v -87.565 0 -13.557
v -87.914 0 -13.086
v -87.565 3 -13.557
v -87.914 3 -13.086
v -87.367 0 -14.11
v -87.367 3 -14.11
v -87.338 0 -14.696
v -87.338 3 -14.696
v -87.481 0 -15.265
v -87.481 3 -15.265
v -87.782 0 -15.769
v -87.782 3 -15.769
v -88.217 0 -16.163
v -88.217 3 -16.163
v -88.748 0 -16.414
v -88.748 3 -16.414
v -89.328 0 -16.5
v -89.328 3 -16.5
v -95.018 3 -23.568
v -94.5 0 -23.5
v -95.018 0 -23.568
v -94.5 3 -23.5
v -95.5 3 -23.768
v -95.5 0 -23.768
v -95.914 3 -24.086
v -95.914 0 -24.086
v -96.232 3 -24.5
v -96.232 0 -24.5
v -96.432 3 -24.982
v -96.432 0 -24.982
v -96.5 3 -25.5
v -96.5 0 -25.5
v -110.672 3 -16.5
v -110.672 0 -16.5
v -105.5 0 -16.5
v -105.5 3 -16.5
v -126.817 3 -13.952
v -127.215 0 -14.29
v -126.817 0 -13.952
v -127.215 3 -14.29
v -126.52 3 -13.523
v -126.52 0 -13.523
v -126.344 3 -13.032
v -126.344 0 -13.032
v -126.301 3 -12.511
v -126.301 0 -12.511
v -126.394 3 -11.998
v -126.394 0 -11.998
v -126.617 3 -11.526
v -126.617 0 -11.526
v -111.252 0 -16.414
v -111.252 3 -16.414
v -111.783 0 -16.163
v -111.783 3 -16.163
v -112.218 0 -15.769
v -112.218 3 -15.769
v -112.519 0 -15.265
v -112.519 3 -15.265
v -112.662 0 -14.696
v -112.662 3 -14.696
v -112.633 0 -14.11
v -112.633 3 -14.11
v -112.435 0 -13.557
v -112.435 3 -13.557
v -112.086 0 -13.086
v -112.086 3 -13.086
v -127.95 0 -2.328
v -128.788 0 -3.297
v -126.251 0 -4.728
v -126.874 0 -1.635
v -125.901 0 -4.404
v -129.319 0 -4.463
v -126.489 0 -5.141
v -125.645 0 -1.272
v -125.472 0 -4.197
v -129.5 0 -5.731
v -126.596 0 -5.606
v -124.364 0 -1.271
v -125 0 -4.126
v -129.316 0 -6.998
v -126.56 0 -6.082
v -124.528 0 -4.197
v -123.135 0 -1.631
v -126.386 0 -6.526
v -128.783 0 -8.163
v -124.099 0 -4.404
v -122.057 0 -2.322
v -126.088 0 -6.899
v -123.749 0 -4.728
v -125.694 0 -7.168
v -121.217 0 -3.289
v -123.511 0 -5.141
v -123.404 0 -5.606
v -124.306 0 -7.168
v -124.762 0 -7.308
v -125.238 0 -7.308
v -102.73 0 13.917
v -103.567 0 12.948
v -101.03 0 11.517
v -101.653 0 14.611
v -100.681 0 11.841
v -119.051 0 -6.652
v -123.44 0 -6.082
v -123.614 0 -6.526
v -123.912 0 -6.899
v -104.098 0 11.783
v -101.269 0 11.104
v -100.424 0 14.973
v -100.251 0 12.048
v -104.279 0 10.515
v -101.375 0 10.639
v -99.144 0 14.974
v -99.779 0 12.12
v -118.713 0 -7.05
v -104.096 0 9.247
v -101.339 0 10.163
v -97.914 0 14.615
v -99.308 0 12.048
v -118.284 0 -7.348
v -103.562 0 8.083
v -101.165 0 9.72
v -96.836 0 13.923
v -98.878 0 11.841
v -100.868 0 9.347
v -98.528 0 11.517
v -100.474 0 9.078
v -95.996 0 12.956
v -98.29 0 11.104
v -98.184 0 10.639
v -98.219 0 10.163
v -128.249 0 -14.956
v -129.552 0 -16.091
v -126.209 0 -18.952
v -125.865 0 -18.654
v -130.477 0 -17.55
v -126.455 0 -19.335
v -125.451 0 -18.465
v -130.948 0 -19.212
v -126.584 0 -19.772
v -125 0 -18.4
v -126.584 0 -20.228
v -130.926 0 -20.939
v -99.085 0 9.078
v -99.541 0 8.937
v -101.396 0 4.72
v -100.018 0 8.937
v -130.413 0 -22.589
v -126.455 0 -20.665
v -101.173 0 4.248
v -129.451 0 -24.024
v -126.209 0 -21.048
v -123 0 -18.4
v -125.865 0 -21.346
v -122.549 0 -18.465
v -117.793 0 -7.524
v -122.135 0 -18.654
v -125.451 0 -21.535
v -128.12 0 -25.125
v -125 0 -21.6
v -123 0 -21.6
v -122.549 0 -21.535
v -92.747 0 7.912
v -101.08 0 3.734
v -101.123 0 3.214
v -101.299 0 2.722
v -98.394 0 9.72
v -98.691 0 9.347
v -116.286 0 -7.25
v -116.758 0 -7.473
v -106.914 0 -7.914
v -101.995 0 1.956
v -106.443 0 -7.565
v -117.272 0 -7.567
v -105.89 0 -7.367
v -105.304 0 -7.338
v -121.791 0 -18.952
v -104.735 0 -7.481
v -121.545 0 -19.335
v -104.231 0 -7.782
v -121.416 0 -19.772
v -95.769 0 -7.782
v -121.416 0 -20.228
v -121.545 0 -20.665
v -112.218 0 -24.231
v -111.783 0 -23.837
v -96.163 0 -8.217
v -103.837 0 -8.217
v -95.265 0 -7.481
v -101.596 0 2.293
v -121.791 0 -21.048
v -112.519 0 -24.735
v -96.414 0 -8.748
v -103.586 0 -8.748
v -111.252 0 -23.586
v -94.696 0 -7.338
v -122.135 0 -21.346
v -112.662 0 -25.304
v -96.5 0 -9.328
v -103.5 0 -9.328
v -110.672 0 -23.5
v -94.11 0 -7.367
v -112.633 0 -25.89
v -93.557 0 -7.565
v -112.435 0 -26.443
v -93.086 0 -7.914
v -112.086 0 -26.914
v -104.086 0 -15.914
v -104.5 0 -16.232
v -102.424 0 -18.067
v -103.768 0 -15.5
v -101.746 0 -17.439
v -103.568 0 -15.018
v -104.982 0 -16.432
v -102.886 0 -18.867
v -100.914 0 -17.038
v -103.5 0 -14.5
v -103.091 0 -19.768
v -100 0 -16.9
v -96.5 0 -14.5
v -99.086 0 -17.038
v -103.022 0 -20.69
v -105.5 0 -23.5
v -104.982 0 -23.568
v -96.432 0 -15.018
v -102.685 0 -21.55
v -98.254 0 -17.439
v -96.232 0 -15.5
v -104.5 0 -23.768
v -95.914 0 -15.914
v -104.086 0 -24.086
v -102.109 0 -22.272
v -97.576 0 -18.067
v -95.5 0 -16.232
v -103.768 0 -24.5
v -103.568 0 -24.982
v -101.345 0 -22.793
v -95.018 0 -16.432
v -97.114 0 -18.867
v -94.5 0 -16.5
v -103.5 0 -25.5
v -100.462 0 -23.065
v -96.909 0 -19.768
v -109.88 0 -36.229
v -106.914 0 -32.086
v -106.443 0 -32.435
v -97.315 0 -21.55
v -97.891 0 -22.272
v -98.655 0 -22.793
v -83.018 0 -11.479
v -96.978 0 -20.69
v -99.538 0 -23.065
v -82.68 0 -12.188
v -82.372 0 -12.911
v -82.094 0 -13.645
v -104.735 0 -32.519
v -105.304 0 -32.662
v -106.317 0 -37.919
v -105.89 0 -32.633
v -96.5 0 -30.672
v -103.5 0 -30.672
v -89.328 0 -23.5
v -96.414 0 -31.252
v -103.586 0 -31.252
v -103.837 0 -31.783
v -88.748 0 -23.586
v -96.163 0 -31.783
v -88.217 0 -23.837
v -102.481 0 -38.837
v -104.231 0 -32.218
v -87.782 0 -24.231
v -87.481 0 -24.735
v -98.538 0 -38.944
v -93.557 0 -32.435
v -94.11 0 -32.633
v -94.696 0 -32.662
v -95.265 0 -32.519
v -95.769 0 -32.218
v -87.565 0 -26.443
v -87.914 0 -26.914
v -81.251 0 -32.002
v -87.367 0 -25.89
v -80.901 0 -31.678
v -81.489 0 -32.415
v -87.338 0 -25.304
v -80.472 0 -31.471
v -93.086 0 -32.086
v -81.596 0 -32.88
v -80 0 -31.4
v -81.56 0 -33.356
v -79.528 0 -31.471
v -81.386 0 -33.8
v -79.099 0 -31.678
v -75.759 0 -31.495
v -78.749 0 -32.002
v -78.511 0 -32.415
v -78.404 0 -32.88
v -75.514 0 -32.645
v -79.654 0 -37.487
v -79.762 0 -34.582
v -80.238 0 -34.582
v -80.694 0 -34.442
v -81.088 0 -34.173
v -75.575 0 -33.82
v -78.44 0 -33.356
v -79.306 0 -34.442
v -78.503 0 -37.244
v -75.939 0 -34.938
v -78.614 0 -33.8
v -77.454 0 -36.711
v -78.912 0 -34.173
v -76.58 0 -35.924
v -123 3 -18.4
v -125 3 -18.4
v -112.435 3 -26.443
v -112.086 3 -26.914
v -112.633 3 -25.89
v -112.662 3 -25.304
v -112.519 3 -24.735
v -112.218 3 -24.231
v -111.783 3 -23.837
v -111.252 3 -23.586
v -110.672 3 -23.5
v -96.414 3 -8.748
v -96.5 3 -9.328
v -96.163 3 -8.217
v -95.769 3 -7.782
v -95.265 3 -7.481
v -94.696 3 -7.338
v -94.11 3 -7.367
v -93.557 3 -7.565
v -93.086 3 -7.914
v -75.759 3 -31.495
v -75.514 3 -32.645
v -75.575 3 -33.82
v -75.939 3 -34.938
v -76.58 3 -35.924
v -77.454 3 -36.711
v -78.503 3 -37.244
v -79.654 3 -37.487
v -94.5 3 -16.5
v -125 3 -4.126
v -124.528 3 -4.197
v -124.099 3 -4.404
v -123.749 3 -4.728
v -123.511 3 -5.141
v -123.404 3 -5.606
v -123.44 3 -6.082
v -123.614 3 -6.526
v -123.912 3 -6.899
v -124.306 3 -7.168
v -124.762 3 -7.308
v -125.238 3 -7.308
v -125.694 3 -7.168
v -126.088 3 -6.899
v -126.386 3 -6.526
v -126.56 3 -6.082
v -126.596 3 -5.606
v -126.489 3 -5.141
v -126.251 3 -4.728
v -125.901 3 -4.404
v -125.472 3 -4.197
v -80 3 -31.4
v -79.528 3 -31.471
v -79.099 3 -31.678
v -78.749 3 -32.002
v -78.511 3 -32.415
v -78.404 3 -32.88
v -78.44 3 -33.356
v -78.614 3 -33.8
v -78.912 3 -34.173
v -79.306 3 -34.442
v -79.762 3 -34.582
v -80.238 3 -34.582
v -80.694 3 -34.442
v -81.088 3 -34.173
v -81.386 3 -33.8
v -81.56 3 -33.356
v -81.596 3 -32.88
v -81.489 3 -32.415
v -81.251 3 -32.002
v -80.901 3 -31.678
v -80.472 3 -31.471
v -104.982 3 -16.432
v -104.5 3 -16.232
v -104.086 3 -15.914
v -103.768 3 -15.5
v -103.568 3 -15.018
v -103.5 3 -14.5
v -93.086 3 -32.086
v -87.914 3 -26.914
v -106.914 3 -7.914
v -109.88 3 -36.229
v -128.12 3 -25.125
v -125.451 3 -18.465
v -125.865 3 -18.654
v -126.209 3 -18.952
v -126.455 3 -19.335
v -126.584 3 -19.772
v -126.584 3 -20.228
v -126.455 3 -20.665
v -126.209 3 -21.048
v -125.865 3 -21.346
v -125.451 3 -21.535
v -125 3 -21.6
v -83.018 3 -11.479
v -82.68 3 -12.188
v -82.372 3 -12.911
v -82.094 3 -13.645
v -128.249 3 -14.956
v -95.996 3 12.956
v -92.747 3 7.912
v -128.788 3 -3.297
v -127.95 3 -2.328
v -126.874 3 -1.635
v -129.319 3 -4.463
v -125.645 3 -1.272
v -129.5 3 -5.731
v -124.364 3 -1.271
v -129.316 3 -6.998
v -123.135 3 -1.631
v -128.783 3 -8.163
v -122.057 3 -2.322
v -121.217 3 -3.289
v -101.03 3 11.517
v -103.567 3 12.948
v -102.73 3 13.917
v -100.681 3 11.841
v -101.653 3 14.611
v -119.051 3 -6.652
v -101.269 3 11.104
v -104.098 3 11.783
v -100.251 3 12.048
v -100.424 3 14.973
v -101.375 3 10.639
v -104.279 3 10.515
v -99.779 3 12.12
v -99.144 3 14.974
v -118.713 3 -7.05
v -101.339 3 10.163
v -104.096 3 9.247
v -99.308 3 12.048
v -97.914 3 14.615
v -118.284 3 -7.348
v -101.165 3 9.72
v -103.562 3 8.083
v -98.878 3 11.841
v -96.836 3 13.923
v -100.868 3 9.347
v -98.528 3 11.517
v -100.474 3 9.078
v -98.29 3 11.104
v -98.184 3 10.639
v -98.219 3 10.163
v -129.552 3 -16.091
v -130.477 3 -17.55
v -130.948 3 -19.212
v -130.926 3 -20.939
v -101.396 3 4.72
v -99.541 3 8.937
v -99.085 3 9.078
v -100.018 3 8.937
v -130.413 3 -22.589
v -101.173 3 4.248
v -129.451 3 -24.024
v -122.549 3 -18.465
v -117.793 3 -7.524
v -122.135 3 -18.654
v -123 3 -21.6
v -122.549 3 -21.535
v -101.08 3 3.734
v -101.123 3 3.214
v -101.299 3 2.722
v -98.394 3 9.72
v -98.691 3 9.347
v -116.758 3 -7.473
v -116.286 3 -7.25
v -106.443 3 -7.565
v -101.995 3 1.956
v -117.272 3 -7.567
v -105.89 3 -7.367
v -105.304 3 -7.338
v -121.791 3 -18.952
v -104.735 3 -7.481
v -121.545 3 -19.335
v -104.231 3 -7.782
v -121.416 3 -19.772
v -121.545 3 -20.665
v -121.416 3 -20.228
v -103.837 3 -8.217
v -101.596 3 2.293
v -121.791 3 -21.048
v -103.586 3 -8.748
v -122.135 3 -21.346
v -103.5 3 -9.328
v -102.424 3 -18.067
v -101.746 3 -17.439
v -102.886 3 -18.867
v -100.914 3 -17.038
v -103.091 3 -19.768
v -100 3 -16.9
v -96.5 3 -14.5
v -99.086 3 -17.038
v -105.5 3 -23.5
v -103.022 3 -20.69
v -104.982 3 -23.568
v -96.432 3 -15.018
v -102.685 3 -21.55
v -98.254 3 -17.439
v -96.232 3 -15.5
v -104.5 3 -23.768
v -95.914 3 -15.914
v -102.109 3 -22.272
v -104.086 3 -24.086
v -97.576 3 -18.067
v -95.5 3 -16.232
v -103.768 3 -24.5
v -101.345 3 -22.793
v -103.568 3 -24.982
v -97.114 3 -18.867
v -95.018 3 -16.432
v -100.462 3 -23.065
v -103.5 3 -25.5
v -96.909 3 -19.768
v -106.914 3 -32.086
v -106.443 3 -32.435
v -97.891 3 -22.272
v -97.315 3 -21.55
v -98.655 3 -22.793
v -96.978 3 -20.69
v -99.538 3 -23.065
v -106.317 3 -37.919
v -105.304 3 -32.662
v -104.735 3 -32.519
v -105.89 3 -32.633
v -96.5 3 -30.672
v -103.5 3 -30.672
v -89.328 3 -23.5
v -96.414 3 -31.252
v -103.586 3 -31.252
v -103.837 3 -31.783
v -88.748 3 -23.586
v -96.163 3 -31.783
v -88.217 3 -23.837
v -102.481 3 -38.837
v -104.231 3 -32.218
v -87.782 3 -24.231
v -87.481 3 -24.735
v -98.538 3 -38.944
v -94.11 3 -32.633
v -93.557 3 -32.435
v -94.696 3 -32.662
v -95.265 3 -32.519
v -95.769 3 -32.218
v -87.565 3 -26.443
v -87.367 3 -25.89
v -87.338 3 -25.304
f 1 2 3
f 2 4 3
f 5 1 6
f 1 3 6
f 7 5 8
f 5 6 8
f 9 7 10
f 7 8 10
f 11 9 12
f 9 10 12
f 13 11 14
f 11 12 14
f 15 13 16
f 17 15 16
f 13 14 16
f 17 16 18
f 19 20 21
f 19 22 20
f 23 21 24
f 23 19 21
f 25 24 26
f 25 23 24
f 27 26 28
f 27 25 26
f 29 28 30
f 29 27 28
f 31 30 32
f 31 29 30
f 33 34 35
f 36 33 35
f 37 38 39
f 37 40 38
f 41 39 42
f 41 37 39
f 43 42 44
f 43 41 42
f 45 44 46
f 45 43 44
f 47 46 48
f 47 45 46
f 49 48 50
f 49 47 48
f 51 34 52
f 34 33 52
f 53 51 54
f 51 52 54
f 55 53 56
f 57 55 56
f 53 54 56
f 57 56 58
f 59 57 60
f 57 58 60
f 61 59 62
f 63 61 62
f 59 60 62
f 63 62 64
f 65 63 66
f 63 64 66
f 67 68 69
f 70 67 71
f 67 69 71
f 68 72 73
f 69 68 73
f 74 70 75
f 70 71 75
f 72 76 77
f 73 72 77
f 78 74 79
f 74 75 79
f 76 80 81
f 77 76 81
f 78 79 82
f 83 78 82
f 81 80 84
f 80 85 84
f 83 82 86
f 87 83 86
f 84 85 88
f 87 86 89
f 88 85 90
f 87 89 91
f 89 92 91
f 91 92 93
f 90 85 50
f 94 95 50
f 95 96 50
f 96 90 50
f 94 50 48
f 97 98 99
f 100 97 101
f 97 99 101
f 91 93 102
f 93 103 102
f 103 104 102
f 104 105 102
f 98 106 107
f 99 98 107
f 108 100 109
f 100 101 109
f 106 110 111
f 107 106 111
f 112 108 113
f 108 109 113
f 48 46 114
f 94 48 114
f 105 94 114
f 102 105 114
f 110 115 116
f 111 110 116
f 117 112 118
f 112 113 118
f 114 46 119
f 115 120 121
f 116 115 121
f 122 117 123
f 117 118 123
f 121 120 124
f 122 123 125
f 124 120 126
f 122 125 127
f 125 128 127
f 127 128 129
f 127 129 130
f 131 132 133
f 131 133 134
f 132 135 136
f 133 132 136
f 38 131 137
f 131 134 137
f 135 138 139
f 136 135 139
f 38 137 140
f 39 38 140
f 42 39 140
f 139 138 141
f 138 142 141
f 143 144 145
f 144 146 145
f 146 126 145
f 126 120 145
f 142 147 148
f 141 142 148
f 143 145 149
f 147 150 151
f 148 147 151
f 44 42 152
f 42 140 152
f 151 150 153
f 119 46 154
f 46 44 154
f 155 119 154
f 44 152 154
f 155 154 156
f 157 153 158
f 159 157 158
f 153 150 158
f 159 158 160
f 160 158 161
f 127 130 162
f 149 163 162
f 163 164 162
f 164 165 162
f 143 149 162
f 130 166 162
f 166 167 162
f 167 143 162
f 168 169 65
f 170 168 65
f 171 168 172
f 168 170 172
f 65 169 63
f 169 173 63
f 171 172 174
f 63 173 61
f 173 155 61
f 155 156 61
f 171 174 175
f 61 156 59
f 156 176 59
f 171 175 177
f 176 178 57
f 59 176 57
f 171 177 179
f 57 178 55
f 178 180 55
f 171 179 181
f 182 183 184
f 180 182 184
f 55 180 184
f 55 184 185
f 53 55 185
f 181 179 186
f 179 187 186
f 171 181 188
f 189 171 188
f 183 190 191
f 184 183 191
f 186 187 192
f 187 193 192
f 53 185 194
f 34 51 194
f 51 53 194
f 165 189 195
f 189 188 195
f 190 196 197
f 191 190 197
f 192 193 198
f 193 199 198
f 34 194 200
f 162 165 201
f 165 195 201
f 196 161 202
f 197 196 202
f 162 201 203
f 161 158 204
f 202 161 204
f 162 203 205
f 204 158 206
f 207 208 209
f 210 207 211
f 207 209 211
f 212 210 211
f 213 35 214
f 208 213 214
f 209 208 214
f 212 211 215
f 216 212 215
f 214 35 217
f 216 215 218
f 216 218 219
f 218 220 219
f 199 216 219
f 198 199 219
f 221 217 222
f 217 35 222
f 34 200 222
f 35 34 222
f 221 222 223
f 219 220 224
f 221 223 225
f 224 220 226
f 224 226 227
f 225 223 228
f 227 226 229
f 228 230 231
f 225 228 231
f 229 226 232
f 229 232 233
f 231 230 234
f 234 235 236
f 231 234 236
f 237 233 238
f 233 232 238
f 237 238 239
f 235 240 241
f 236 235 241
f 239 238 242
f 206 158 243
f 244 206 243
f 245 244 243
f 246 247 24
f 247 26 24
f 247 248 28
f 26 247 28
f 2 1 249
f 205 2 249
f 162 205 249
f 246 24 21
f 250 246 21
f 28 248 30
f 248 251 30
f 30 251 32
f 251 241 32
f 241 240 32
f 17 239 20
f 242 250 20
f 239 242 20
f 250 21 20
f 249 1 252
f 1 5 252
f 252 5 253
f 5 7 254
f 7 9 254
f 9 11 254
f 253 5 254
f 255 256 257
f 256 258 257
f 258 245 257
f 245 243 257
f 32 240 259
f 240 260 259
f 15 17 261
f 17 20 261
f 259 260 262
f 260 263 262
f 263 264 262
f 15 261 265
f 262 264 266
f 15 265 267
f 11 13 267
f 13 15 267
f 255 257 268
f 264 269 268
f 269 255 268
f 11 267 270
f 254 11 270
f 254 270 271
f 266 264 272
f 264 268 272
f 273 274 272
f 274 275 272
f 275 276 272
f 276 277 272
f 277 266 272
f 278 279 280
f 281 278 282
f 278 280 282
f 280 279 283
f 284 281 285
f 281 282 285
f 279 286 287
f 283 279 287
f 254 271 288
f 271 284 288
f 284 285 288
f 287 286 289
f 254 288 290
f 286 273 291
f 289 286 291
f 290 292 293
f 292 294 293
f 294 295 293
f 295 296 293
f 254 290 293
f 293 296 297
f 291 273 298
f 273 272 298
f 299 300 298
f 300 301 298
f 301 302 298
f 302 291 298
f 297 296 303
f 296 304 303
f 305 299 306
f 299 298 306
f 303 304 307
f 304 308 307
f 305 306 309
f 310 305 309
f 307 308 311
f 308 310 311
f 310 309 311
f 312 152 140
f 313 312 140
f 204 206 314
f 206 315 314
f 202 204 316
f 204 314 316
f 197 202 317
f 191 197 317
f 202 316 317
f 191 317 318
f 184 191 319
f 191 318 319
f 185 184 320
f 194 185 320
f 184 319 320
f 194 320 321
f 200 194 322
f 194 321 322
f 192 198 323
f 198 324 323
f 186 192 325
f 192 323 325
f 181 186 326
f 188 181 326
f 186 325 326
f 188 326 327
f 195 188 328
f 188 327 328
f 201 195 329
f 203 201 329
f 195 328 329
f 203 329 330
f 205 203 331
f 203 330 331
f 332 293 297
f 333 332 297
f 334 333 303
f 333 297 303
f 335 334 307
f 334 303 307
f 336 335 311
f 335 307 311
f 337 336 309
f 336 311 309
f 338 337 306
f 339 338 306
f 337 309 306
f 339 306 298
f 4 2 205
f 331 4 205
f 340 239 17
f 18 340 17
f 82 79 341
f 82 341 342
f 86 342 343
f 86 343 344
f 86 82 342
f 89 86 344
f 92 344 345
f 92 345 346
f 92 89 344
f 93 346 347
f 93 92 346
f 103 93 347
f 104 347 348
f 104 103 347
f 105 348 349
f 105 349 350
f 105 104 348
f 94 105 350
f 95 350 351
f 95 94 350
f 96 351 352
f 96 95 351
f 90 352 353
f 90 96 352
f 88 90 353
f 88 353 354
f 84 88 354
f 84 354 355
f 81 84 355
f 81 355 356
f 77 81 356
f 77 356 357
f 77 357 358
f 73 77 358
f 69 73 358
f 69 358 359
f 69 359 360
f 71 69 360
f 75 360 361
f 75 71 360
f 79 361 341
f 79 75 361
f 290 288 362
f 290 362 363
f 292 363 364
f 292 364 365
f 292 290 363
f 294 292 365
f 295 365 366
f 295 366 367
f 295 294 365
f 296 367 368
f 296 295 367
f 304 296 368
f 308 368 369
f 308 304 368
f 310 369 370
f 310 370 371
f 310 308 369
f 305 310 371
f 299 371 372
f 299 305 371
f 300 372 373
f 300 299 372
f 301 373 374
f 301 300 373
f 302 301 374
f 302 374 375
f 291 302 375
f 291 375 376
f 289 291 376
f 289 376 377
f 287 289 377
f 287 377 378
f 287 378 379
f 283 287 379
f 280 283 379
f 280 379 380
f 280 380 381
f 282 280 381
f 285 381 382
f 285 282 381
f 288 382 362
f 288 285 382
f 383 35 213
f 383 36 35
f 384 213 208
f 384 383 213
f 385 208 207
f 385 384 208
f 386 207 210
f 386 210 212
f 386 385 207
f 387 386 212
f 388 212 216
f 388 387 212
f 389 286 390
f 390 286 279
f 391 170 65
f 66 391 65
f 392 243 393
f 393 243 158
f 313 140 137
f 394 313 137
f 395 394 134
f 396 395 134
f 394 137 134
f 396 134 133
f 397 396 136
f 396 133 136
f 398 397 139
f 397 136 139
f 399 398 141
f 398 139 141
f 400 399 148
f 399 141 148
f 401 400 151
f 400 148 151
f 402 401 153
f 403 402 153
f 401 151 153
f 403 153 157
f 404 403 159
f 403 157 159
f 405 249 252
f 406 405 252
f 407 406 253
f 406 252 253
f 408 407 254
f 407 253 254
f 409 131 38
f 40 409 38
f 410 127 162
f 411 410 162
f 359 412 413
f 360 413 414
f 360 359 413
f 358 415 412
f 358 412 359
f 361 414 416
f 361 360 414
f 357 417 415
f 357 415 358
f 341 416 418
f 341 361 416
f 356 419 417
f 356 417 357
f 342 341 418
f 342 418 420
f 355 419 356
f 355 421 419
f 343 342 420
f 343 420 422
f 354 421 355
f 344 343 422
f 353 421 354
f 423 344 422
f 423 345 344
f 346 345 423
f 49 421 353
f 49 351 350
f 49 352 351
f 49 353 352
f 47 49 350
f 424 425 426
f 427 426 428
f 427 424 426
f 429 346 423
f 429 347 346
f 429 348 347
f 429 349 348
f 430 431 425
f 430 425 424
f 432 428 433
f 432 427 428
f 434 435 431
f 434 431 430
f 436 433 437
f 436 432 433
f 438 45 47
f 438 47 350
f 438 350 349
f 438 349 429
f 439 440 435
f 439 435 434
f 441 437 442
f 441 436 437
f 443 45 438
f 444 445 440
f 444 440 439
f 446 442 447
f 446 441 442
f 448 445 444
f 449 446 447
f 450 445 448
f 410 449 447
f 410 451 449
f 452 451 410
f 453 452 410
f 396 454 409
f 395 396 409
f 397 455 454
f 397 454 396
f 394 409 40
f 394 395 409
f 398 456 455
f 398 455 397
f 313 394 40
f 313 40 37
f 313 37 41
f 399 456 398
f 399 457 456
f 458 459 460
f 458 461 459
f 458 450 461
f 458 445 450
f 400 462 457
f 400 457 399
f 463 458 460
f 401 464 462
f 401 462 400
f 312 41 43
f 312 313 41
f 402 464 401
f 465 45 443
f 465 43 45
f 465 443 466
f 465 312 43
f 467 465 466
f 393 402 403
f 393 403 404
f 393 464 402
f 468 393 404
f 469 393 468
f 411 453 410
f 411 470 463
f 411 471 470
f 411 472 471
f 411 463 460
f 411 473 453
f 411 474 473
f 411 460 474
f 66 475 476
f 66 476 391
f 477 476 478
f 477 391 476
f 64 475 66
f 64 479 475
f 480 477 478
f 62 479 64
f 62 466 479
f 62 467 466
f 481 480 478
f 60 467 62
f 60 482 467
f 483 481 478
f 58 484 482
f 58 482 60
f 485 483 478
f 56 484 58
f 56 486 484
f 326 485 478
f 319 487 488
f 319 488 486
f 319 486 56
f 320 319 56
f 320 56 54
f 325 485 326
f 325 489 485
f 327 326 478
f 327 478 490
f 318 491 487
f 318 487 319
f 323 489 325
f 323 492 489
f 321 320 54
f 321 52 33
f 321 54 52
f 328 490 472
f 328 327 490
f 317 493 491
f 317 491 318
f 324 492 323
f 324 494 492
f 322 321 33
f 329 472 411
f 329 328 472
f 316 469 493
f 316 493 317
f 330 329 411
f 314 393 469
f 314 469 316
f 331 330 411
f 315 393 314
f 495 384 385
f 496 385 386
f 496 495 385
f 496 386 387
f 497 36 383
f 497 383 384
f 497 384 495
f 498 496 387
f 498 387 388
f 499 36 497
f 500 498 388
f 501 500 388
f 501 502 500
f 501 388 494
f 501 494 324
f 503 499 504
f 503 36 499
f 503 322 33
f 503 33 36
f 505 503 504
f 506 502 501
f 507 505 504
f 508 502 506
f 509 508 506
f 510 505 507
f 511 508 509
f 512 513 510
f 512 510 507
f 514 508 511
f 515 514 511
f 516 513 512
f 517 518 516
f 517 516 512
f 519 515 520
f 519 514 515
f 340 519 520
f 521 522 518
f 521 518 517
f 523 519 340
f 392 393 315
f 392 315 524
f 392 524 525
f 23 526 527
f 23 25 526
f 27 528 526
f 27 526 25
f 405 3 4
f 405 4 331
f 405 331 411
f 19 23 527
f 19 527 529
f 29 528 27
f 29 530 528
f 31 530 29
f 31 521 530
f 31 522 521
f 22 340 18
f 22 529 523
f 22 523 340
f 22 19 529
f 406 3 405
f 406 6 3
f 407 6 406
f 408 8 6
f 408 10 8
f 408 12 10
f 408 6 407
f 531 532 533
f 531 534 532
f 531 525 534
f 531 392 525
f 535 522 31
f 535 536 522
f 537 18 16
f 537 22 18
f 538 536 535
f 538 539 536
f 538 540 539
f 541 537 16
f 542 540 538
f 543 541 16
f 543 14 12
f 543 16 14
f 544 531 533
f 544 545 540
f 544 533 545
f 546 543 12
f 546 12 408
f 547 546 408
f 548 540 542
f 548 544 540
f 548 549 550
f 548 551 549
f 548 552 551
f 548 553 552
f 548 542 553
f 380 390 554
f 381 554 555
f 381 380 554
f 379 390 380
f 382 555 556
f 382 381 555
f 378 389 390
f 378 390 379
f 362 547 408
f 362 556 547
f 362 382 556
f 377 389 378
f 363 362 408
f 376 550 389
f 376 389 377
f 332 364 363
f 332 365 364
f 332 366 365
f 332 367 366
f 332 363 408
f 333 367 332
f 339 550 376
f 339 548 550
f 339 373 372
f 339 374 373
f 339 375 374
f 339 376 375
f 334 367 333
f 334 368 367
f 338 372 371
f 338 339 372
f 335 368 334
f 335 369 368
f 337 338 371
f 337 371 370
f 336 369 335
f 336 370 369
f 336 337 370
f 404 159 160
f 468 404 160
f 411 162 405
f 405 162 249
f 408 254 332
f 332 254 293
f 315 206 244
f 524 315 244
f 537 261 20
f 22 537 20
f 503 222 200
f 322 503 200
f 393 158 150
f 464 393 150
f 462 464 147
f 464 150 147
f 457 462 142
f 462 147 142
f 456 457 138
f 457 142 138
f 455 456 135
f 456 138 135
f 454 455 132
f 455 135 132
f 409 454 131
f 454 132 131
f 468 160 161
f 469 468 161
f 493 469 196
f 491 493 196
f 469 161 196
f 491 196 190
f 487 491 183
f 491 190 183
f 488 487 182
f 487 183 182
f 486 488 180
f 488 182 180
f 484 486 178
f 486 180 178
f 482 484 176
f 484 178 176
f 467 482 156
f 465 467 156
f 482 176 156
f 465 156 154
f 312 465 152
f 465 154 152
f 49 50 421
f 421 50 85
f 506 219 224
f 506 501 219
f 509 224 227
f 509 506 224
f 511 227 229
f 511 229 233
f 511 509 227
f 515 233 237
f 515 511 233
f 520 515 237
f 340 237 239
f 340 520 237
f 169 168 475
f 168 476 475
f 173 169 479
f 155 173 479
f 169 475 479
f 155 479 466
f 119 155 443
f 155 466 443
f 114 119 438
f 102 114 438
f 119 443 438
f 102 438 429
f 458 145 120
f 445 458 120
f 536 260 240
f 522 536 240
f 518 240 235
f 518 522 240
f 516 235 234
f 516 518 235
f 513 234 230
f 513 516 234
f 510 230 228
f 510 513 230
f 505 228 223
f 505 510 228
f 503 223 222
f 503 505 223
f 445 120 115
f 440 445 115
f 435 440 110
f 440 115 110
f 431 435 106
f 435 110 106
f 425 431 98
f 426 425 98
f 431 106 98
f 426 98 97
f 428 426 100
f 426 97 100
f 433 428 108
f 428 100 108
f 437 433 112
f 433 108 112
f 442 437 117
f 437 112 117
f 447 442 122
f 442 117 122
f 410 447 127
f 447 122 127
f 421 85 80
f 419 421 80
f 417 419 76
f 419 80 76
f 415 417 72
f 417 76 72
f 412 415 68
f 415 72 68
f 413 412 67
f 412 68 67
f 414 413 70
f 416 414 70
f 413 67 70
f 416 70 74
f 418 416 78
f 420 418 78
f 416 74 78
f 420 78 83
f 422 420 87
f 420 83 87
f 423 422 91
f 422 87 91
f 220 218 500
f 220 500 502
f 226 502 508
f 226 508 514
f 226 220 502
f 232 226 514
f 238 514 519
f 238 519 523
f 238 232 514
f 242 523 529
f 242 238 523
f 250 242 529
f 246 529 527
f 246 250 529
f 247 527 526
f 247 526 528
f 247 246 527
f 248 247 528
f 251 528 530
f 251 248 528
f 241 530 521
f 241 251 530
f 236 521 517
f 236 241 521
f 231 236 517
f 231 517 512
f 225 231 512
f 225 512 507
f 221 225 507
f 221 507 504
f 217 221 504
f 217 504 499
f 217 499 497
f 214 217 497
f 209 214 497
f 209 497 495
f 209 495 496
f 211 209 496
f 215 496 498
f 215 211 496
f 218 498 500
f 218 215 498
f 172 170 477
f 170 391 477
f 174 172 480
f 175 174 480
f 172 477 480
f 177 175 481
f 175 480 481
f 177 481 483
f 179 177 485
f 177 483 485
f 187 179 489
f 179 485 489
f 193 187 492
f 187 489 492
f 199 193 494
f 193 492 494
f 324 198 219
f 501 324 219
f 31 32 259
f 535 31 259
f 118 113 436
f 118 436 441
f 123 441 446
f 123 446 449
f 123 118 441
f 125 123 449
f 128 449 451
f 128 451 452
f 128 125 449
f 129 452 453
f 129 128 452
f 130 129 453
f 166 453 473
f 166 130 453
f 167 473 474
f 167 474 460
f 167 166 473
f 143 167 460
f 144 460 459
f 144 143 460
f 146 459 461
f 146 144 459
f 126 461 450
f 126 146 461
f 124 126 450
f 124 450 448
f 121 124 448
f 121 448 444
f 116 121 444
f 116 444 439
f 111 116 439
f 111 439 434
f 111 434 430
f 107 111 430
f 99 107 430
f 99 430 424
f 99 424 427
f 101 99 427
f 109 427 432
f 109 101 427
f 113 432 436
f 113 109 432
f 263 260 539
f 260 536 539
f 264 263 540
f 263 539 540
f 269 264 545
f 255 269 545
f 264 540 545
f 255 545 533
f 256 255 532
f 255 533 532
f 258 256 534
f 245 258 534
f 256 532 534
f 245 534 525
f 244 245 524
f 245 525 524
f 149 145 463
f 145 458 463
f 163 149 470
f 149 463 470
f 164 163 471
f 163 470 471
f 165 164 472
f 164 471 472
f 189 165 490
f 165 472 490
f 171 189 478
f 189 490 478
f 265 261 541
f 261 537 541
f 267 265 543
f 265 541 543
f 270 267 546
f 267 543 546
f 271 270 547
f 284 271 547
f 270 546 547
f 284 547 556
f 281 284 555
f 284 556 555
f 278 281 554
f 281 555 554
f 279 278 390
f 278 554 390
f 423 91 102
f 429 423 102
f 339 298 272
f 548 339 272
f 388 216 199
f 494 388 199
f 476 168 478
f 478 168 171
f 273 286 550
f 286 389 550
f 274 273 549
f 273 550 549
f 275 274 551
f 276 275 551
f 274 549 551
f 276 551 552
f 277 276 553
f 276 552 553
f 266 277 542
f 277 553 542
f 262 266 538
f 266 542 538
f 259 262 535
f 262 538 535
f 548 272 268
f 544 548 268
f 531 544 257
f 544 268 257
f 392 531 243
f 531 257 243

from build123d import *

# Parameters (mm, degrees)
SKETCH_1_R      = 3.1
SKETCH_1_R_2    = 1.6
EXTRUDE_1_DEPTH = 3
FILLET_1_R      = 2


with BuildPart() as part:
    # 草图1 → 凸台-拉伸1 (new body)
    with BuildSketch(Plane(origin=(0, 0, 0), x_dir=(1, 0, 0), z_dir=(0, 1, 0))):
        with BuildLine():
            Line((-82.094284463, 13.64505302), (-75.759172636, 31.494880978))
            ThreePointArc((-75.759172636, 31.494880978), (-76.227003727, 35.452447578), (-79.653832636, 37.486665594))
            Line((-79.653832636, 37.486665594), (-98.538404465, 38.943699177))
            ThreePointArc((-98.538404465, 38.943699177), (-104.422619767, 38.478106894), (-109.88, 36.229158943))
            Line((-109.88, 36.229158943), (-128.12, 25.124997561))
            ThreePointArc((-128.12, 25.124997561), (-130.999516523, 20.076167551), (-128.249103426, 14.955862123))
            Line((-128.249103426, 14.955862123), (-125.533999982, 13.206970217))
            Line((-125.533999982, 13.206970217), (-128.783103408, 8.16283234))
            ThreePointArc((-128.783103408, 8.16283234), (-127.43682757, 1.942901362), (-121.216896592, 3.289177201))
            Line((-121.216896592, 3.289177201), (-117.967793166, 8.333315078))
            Line((-117.967793166, 8.333315078), (-100.313310595, -3.038546913))
            Line((-100.313310595, -3.038546913), (-103.562414021, -8.08268479))
            ThreePointArc((-103.562414021, -8.08268479), (-102.216138182, -14.302615768), (-95.996207205, -12.956339929))
            Line((-95.996207205, -12.956339929), (-92.747103778, -7.912202052))
            Line((-92.747103778, -7.912202052), (-83.017679727, 11.479389802))
            ThreePointArc((-83.017679727, 11.479389802), (-82.522406202, 12.547905325), (-82.094284463, 13.64505302))
        make_face()
        Polygon((-96.5, 16.5), (-84.5, 16.5), (-96.5, 4.5), align=None, mode=Mode.SUBTRACT)
        Polygon((-103.5, 16.5), (-103.5, 4.5), (-115.5, 16.5), align=None, mode=Mode.SUBTRACT)
        Polygon((-103.5, 23.5), (-115.5, 23.5), (-103.5, 35.5), align=None, mode=Mode.SUBTRACT)
        Polygon((-96.5, 23.5), (-96.5, 35.5), (-84.5, 23.5), align=None, mode=Mode.SUBTRACT)
        with Locations(Location((-100, 20, 0), (0, 0, 270))):
            Circle(SKETCH_1_R, mode=Mode.SUBTRACT)
        with Locations(Location((-80, 33, 0), (0, 0, 270))):
            Circle(SKETCH_1_R_2, mode=Mode.SUBTRACT)
        with BuildLine():
            Line((-125, 21.6), (-123, 21.6))
            ThreePointArc((-123, 21.6), (-121.4, 20), (-123, 18.4))
            Line((-123, 18.4), (-125, 18.4))
            ThreePointArc((-125, 18.4), (-126.6, 20), (-125, 21.6))
        make_face(mode=Mode.SUBTRACT)
        with Locations(Location((-99.779310613, -10.51951236, 0), (0, 0, 270))):
            Circle(SKETCH_1_R_2, mode=Mode.SUBTRACT)
        with Locations(Location((-125, 5.726004771, 0), (0, 0, 270))):
            Circle(SKETCH_1_R_2, mode=Mode.SUBTRACT)
    extrude(amount=EXTRUDE_1_DEPTH)

    # 圆角1
    fillet_1_edges = [part.edges().sort_by_distance(p)[0] for p in [
        (-96.5, 1.5, -16.5),
        (-96.5, 1.5, -4.5),
        (-84.5, 1.5, -16.5),
        (-103.5, 1.5, -4.5),
        (-103.5, 1.5, -16.5),
        (-115.5, 1.5, -16.5),
        (-115.5, 1.5, -23.5),
        (-103.5, 1.5, -23.5),
        (-103.5, 1.5, -35.5),
        (-96.5, 1.5, -35.5),
        (-96.5, 1.5, -23.5),
        (-84.5, 1.5, -23.5),
        (-100.313310595, 1.5, 3.038546913),
        (-117.967793166, 1.5, -8.333315078),
        (-125.533999982, 1.5, -13.206970217),
    ]]
    fillet(fillet_1_edges, radius=FILLET_1_R)


solid = part.part
